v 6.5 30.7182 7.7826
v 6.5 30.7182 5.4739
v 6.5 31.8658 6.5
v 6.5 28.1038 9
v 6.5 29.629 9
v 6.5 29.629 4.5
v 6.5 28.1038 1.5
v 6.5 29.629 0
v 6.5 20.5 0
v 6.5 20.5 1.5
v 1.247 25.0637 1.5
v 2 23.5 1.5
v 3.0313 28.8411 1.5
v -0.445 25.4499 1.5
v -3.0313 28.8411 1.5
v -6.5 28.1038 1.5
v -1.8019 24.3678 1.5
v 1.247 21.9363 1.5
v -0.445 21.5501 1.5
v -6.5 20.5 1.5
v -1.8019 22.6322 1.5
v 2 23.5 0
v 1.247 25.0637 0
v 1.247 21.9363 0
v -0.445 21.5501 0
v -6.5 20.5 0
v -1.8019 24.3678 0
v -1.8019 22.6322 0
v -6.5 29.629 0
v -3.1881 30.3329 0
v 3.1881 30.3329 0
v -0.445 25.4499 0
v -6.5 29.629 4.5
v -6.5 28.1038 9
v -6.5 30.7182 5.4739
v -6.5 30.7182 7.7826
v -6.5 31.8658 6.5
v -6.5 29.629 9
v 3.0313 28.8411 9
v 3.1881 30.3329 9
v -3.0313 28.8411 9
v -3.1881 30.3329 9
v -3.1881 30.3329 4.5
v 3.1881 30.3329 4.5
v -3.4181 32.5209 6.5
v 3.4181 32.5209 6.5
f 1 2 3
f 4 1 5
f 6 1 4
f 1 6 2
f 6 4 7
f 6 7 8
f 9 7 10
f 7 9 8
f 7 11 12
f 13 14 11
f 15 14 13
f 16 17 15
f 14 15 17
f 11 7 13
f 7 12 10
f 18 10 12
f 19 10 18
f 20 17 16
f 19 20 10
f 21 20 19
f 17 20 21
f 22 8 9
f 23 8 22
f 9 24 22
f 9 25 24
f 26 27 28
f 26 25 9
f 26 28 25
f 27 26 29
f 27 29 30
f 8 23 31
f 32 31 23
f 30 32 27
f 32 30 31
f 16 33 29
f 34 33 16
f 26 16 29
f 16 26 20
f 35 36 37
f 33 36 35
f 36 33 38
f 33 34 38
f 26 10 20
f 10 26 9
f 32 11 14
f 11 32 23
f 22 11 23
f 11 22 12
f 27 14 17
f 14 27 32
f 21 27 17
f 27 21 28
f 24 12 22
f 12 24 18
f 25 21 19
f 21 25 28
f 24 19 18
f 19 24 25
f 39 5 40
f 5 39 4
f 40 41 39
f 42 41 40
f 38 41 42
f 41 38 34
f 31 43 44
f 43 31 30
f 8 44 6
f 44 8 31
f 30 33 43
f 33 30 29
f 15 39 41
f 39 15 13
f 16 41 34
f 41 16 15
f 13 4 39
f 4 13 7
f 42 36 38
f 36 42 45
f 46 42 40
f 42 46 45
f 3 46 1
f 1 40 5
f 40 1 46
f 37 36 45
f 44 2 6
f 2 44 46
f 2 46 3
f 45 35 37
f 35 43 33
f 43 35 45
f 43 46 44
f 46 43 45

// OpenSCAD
outer_cap_dia = 58; // Outer diameter of a cap
base_cap_height = 1.5; // Height of the cap base
thickness = 1.5; // Thickness of the wall
connector_height = 9; // Height of the "pin"
connector_hole_dia = 4; // Dia of the connector hole
connector_hole_offset = 3; // Offset from the base edge
connector_size = 8.5;
lock_holder_width = 13; // Width of the pin
lock_pin_size = 2.2; // Additional thikness of the pin

//horizontal body
difference()
{
    translate([-lock_holder_width / 2, outer_cap_dia / 2 - connector_size, 0])
    {
        cube([lock_holder_width, connector_size, base_cap_height]);
    }
    translate([0, outer_cap_dia / 2 - connector_size + connector_hole_offset, 0])
    {
        cylinder(h = base_cap_height, r = connector_hole_dia / 2);
    }
}
//vertical body
intersection()
{   
    translate([-lock_holder_width / 2, 0, 0])
    {
        cube([lock_holder_width, outer_cap_dia, connector_height]);
    }
    union()
    {
        difference()
        {
            cylinder(h = connector_height, r = outer_cap_dia / 2 + thickness);
            cylinder(h = connector_height, r = outer_cap_dia / 2);
        }
        translate([0, 0, connector_height - 2.5])
        {
            difference()
            {
                cylinder(h = 2.5, r = (outer_cap_dia / 2 - 2.5));
                cylinder(h = 2.5, r2 = (outer_cap_dia / 2 - 2.5), r1 = (outer_cap_dia / 2 - 1));
            }
        }
        
        //locking body
        difference()
        {
            union()
            {
                translate([0, 0, connector_height - 1.5 - 1])
                {
                    cylinder(h = 2.5, r2 = (outer_cap_dia / 2 + thickness), r1 = (outer_cap_dia / 2 + thickness + lock_pin_size));
                }
                translate([0, 0, connector_height - 3.5 - 1])
                {
                    cylinder(h = 2, r1 = (outer_cap_dia / 2 + thickness), r2 = (outer_cap_dia / 2 + thickness + lock_pin_size));
                }
            }
            cylinder(h = connector_height, r = outer_cap_dia / 2);
        }
    }
}
